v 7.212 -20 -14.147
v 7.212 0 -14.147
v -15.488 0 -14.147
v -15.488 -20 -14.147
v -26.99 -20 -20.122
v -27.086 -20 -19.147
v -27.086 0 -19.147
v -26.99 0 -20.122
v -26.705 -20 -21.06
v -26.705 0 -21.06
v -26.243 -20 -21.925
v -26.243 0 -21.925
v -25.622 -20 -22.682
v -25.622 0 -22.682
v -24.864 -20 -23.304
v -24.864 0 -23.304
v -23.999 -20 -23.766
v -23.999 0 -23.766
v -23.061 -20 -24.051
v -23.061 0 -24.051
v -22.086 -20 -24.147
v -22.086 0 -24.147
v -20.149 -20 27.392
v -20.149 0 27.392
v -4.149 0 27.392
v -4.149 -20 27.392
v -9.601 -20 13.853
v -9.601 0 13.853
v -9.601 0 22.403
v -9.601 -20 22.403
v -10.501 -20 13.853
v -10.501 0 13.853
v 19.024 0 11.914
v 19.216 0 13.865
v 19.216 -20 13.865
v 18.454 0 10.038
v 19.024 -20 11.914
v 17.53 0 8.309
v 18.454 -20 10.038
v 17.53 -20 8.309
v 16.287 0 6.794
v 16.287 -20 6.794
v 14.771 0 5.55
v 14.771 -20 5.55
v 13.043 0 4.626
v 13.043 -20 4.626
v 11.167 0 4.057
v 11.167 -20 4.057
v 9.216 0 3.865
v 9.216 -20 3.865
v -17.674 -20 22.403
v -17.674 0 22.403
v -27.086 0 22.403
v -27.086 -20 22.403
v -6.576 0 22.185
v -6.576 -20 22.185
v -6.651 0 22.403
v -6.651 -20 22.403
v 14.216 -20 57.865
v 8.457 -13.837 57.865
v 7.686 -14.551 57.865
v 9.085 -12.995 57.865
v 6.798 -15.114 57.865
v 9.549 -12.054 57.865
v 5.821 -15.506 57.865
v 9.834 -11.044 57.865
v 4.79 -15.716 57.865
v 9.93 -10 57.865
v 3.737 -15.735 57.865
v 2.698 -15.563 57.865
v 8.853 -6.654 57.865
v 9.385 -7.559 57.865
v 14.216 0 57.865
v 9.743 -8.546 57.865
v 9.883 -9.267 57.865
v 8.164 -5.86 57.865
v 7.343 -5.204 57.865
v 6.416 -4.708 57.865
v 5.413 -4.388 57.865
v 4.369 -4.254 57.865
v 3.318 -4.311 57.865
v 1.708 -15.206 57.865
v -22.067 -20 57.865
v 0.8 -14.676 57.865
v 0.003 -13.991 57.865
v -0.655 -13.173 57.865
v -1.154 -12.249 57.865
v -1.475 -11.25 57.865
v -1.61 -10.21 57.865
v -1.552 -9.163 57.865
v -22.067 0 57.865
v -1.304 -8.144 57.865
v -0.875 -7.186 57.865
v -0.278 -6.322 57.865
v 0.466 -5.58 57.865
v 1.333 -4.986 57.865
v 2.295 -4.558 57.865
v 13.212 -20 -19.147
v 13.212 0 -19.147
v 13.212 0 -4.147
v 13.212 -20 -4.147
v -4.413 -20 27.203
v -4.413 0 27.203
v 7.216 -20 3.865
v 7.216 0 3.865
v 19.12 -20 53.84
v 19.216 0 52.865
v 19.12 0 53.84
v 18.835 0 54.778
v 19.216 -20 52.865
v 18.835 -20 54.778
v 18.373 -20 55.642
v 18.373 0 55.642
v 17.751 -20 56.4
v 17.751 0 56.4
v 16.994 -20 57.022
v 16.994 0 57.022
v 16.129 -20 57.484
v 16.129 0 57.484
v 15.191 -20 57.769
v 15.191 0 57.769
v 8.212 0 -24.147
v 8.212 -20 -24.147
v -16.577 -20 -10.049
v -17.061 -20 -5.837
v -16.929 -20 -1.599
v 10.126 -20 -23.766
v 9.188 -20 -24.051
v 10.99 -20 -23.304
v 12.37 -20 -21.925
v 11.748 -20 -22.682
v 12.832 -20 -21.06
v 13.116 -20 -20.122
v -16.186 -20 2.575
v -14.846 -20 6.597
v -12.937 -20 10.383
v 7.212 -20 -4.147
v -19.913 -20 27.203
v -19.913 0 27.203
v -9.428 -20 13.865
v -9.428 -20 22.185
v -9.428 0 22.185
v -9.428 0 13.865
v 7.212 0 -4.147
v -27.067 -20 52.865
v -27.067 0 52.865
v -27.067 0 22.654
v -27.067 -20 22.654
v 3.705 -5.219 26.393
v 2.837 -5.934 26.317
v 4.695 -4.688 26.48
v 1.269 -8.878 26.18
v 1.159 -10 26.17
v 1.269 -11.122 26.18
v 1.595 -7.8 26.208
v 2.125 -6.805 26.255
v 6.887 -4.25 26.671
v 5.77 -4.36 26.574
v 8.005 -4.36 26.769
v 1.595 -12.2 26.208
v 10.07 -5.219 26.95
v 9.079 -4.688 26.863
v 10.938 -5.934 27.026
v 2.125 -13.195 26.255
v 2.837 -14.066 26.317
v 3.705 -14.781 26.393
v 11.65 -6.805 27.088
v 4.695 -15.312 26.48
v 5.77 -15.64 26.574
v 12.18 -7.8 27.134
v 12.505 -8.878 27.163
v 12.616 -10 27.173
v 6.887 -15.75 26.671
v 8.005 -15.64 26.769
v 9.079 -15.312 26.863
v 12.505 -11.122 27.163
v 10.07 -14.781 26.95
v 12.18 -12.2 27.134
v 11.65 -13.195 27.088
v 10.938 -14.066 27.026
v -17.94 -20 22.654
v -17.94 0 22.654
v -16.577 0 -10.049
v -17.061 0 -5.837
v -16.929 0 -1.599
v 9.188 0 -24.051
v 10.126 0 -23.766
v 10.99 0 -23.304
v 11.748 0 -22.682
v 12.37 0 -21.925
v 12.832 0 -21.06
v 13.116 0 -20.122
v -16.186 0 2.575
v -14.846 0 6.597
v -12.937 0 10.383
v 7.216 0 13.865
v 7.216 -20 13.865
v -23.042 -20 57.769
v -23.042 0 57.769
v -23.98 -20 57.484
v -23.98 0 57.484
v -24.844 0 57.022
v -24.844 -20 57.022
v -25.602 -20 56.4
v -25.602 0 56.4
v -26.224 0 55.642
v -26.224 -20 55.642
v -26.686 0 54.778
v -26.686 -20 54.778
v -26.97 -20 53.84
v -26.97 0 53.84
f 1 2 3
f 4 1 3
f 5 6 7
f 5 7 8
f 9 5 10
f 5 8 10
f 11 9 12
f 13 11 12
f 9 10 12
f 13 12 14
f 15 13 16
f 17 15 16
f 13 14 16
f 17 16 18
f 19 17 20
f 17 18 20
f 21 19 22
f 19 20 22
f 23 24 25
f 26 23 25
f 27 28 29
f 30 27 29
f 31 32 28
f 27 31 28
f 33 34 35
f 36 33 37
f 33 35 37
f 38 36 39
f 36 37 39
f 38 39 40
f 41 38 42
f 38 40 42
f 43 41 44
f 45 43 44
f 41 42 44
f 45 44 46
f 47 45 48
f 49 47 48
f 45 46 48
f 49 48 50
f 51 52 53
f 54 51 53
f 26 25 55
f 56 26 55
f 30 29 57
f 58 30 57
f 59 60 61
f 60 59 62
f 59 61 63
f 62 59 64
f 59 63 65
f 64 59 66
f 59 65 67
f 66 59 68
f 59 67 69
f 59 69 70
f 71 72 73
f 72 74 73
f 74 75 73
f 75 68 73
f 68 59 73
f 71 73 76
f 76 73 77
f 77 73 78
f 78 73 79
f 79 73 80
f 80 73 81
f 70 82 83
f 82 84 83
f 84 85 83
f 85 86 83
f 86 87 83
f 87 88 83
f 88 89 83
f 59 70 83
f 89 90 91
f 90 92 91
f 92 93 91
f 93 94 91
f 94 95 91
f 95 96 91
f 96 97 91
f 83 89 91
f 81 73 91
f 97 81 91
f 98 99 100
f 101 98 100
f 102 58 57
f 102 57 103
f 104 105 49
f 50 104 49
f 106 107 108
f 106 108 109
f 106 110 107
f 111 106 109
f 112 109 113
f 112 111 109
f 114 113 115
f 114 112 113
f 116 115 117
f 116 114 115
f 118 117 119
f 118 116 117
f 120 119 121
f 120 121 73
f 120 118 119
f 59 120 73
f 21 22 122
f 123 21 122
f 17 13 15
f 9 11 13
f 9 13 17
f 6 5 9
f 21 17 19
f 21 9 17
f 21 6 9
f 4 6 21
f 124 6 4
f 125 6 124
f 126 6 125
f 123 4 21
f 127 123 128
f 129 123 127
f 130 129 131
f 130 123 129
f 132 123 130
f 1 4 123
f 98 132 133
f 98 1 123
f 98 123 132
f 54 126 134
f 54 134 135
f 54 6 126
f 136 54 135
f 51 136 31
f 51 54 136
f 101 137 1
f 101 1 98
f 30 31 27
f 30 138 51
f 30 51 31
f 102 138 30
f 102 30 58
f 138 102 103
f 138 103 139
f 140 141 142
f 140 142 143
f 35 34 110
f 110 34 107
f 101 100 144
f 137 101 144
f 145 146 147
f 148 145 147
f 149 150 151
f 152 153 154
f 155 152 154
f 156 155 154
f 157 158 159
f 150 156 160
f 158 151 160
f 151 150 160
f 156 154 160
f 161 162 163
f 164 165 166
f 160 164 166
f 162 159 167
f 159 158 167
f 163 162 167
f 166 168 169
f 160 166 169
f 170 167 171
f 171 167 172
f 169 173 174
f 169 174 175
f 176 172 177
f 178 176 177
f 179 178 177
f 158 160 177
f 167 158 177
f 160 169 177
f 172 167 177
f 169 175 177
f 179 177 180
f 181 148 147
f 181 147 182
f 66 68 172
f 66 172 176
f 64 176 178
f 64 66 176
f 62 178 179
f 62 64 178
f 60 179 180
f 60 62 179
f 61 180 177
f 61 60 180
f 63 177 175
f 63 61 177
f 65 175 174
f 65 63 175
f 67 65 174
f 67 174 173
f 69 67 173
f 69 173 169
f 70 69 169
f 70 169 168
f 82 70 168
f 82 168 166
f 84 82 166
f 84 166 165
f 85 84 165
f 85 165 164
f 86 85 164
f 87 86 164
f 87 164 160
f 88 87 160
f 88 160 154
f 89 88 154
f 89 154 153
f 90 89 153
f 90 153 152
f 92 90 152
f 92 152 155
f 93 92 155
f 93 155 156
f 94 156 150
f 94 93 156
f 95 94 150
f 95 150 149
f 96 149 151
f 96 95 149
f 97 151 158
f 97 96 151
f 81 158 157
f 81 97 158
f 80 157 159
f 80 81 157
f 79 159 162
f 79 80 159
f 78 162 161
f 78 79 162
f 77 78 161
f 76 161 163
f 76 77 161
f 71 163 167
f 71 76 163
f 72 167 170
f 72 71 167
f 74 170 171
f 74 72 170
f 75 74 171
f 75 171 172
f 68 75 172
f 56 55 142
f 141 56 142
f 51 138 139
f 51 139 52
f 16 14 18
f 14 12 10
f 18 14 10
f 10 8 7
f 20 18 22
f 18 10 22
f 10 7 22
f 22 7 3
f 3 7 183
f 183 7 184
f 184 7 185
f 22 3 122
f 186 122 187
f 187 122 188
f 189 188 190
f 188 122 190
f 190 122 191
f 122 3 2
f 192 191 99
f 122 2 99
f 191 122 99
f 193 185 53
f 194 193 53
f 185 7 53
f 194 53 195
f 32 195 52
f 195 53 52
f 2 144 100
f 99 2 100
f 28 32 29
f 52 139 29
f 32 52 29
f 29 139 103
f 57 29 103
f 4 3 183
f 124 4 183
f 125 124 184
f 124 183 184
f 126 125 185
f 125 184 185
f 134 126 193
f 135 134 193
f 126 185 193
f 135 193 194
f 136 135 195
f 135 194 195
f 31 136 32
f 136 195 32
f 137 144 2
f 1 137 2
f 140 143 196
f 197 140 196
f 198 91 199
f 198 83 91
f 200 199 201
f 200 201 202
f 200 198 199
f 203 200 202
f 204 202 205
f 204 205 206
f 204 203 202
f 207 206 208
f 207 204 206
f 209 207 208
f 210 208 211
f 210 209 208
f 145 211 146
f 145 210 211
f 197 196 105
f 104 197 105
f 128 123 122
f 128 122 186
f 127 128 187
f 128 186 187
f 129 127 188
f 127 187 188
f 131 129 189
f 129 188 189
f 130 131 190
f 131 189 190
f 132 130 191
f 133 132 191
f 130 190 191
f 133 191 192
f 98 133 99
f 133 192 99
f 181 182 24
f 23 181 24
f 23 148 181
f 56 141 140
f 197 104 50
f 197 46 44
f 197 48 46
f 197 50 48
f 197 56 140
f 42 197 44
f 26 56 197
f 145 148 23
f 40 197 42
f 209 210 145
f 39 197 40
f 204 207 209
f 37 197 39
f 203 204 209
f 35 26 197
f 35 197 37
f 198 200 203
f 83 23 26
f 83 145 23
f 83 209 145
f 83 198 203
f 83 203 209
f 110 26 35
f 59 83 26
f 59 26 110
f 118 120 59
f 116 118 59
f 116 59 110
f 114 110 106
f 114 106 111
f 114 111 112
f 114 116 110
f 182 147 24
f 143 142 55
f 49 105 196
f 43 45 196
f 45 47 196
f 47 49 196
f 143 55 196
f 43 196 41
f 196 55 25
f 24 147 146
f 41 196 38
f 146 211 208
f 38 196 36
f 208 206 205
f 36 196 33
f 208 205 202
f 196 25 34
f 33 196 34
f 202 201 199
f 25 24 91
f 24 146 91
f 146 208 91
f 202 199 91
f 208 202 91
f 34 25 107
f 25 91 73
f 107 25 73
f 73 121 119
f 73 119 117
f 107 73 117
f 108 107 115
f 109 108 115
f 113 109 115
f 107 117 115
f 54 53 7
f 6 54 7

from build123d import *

# Parameters (mm, degrees)
F2_DEPTH = 20
F3_DEPTH = 20
F6_R     = 5.75
F7_DEPTH = 45
F8_R     = 5
F9_R     = 10


# Not quite as in the source:
# - ends of sketch curves that miss each other by under 0.0002 mm in the source are joined


with BuildPart() as f2:
    # F0 (on Front) → F2 (new body)
    with BuildSketch(Plane.XZ):
        with BuildLine():
            Line((-17.6743378025, 22.4031258792), (-27.0860093031, 22.4031258792))
            Line((-27.0860093031, 22.4031258792), (-27.0860093031, -19.1468741208))
            ThreePointArc((-27.0860093031, -19.1468741208), (-25.6215432091, -22.6824080268), (-22.0860093031, -24.1468741208))
            Line((-22.0860093031, -24.1468741208), (8.2122150655, -24.1468741208))
            ThreePointArc((8.2122150655, -24.1468741208), (11.7477489715, -22.6824080268), (13.2122150655, -19.1468741208))
            Line((13.2122150655, -19.1468741208), (13.2122150655, -4.1468741208))
            Line((13.2122150655, -4.1468741208), (7.2122150655, -4.1468741208))
            Line((7.2122150655, -4.1468741208), (7.2122150655, -14.1468741208))
            Line((7.2122150655, -14.1468741208), (-15.4877849345, -14.1468741208))
            ThreePointArc((-15.4877849345, -14.1468741208), (-16.633584051, 0.5013324305), (-10.5006873054, 13.8531258792))
            Line((-10.5006873054, 13.8531258792), (-9.6008945616, 13.8531258792))
            Line((-9.6008945616, 13.8531258792), (-9.6008945616, 22.4031258792))
            Line((-9.6008945616, 22.4031258792), (-6.6508978025, 22.4031258792))
            Line((-6.6508978025, 22.4031258792), (-4.4126178025, 27.2031328292))
            Line((-4.4126178025, 27.2031328292), (-19.9126178025, 27.2031328292))
            Line((-19.9126178025, 27.2031328292), (-17.6743378025, 22.4031258792))
        make_face()
    extrude(amount=F2_DEPTH)


with BuildPart() as f3:
    # F1 (on Front) → F3 (new body)
    with BuildSketch(Plane.XZ):
        Polygon((-9.4277657694, 13.8645800784), (7.2156684956, 13.8645800784), (7.2156684956, 3.8645800784), (19.2156684956, 3.8645800784), (19.2156684956, 57.8645800784), (-27.0665612229, 57.8645800784), (-27.0665612229, 22.6542197451), (-17.9396021321, 22.6542197451), (-20.1487108764, 27.3916687354), (-4.1487108764, 27.3916687354), (-6.5764416154, 22.1853833646), (-9.4277657694, 22.1853833646), align=None)
    extrude(amount=F3_DEPTH)

    # F6 (on face) → F7 (cut)
    with BuildSketch(Plane(origin=(-6.1854109913, 0, 70.6995711451), x_dir=(0.9961946981, 0, 0.0871557427), z_dir=(0.0871557427, 0, -0.9961946981))):
        with Locations((9.1857775311, 10)):
            Circle(F6_R)
    extrude(amount=F7_DEPTH, mode=Mode.SUBTRACT)

    # F8
    f8_edges = [f3.edges().sort_by_distance(p)[0] for p in [
        (-27.066561, -10, 57.86458),
        (19.215668, -10, 57.86458),
    ]]
    fillet(f8_edges, radius=F8_R)

    # F9
    f9_edges = [f3.edges().sort_by_distance(p)[0] for p in [
        (19.215668, -10, 3.86458),
    ]]
    fillet(f9_edges, radius=F9_R)


solid = Compound([f2.part, f3.part])
